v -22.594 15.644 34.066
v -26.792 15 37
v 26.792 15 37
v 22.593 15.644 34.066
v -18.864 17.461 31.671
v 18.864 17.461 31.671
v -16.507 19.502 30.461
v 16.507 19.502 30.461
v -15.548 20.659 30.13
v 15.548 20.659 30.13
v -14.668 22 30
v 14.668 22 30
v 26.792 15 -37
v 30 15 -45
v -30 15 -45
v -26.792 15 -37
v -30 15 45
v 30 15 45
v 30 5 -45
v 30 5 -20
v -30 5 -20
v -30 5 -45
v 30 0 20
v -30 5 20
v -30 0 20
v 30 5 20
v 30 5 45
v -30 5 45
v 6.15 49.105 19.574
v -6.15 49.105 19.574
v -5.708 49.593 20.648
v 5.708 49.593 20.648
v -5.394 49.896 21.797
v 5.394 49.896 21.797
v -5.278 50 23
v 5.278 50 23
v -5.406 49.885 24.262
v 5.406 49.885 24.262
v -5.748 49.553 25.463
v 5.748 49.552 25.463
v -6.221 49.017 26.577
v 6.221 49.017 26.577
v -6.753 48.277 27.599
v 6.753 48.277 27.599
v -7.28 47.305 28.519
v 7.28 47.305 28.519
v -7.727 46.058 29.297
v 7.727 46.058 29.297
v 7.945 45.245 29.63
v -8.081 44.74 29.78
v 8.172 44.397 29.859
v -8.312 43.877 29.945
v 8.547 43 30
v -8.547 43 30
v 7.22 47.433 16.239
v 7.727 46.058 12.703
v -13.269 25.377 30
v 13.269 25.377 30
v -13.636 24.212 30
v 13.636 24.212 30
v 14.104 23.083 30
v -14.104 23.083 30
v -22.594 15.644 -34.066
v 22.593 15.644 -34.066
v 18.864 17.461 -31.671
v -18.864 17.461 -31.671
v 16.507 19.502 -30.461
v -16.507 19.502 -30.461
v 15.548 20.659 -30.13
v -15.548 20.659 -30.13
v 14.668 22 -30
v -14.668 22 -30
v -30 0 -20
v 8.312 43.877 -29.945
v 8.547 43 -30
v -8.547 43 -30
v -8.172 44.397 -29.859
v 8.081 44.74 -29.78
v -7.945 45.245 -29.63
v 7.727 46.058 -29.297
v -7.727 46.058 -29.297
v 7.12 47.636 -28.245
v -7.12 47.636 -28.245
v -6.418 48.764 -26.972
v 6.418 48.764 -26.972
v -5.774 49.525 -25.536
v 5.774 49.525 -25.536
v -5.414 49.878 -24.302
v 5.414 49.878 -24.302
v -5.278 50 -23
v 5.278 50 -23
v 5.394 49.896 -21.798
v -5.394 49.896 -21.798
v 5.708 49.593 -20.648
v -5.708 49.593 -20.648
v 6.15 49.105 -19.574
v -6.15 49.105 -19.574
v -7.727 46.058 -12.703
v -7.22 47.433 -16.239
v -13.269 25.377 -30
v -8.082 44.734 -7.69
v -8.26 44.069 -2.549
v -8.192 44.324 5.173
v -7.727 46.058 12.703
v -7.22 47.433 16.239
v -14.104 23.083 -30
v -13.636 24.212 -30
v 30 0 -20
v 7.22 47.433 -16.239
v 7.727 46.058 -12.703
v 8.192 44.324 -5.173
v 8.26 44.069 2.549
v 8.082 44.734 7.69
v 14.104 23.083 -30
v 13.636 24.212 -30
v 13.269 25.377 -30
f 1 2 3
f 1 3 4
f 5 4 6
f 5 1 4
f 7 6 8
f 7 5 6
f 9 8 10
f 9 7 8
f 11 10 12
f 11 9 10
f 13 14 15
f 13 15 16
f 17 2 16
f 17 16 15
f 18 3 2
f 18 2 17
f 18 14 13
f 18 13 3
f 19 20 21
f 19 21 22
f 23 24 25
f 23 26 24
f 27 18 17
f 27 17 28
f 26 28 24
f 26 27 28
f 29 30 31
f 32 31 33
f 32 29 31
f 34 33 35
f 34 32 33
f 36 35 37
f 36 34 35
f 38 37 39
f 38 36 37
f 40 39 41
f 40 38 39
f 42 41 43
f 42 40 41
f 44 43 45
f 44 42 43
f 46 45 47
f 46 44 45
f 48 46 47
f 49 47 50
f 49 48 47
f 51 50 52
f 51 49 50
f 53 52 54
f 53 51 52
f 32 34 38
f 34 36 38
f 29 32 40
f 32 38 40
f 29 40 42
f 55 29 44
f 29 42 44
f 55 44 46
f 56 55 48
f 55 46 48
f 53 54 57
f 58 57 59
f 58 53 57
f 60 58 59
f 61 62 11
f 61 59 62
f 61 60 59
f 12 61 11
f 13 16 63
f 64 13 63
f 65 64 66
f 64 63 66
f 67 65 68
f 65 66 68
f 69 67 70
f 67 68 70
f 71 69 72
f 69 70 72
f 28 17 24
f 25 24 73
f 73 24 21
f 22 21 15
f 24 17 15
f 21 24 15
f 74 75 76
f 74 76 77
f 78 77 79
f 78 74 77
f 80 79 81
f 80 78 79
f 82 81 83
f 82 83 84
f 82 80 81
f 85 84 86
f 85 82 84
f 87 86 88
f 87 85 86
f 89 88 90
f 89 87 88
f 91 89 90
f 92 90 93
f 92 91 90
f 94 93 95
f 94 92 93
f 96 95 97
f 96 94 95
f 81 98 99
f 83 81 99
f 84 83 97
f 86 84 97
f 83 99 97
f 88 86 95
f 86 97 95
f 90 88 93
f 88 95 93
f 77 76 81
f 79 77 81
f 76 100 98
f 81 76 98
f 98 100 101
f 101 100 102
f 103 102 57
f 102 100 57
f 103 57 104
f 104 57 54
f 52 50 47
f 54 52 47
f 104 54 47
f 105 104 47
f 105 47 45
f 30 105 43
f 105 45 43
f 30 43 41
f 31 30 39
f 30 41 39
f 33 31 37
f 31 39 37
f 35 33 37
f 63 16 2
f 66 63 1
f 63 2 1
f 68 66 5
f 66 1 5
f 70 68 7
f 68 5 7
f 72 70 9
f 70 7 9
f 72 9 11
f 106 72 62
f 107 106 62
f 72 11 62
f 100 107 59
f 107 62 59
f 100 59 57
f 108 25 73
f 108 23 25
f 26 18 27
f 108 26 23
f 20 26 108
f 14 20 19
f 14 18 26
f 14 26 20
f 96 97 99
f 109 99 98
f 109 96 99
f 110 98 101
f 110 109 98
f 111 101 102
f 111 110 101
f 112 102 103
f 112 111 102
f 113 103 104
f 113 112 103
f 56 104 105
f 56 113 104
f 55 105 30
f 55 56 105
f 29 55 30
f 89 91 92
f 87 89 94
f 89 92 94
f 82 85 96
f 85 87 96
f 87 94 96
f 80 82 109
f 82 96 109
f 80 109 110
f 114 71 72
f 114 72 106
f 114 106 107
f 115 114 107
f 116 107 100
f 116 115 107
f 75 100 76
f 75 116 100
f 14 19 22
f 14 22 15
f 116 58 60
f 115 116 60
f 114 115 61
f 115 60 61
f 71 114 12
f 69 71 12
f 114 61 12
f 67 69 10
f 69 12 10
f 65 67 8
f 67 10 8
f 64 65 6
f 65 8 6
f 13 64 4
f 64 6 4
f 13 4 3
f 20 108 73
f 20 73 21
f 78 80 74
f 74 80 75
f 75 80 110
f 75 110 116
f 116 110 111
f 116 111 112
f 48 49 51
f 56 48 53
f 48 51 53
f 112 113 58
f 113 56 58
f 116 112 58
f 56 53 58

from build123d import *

# Parameters (mm, degrees)
BOSS_EXTRUDE1_DEPTH = 30
BOSS_EXTRUDE2_DEPTH = 30
FILLET1_R           = 7
CUT_EXTRUDE1_DEPTH  = 91


with BuildPart() as part:
    # Sketch1 → Boss-Extrude1 (new body, symmetric)
    with BuildSketch(Plane(origin=(0, 0, 0), x_dir=(0, 0, -1), z_dir=(1, 0, 0))):
        Polygon((-20, 0), (20, 0), (20, 5), (45, 5), (45, 15), (-45, 15), (-45, 5), (-20, 5), align=None)
    extrude(amount=BOSS_EXTRUDE1_DEPTH, both=True)

    # Sketch4 → Boss-Extrude2 (add, symmetric)
    with BuildSketch(Plane(origin=(0, 0, 0), x_dir=(0, 0, -1), z_dir=(1, 0, 0))):
        with BuildLine():
            Line((30, 15), (30, 43))
            ThreePointArc((30, 43), (26.537038068, 49.040642491), (19.574468085, 49.104566414))
            ThreePointArc((19.574468085, 49.104566414), (0, 43.987803064), (-19.574468085, 49.104566414))
            ThreePointArc((-19.574468085, 49.104566414), (-26.537038068, 49.040642491), (-30, 43))
            Line((-30, 43), (-30, 15))
            Line((-30, 15), (30, 15))
        make_face()
    extrude(amount=BOSS_EXTRUDE2_DEPTH, both=True)

    # Fillet1
    fillet1_edges = [part.edges().sort_by_distance(p)[0] for p in [
        (0, 15, 30),
        (0, 15, -30),
    ]]
    fillet(fillet1_edges, radius=FILLET1_R)

    # Sketch5 → Cut-Extrude1 (cut, through all)
    with BuildSketch(Plane.XY.offset(45)):
        with BuildLine():
            ThreePointArc((-7.72740661, 46.058355425), (-6.794626723, 48.210722397), (-5.277640382, 50))
            Line((-5.277640382, 50), (-30, 50))
            Line((-30, 50), (-30, 15))
            Line((-30, 15), (-26.792045696, 15))
            ThreePointArc((-26.792045696, 15), (-18.26938569, 17.893053236), (-13.269084128, 25.376533369))
            Line((-13.269084128, 25.376533369), (-7.72740661, 46.058355425))
        make_face()
        with BuildLine():
            ThreePointArc((5.277640382, 50), (6.794626723, 48.210722397), (7.72740661, 46.058355425))
            Line((7.72740661, 46.058355425), (13.269084128, 25.376533369))
            ThreePointArc((13.269084128, 25.376533369), (18.26938569, 17.893053236), (26.792045696, 15))
            Line((26.792045696, 15), (30, 15))
            Line((30, 15), (30, 50))
            Line((30, 50), (5.277640382, 50))
        make_face()
    extrude(amount=-CUT_EXTRUDE1_DEPTH, mode=Mode.SUBTRACT)


solid = part.part
